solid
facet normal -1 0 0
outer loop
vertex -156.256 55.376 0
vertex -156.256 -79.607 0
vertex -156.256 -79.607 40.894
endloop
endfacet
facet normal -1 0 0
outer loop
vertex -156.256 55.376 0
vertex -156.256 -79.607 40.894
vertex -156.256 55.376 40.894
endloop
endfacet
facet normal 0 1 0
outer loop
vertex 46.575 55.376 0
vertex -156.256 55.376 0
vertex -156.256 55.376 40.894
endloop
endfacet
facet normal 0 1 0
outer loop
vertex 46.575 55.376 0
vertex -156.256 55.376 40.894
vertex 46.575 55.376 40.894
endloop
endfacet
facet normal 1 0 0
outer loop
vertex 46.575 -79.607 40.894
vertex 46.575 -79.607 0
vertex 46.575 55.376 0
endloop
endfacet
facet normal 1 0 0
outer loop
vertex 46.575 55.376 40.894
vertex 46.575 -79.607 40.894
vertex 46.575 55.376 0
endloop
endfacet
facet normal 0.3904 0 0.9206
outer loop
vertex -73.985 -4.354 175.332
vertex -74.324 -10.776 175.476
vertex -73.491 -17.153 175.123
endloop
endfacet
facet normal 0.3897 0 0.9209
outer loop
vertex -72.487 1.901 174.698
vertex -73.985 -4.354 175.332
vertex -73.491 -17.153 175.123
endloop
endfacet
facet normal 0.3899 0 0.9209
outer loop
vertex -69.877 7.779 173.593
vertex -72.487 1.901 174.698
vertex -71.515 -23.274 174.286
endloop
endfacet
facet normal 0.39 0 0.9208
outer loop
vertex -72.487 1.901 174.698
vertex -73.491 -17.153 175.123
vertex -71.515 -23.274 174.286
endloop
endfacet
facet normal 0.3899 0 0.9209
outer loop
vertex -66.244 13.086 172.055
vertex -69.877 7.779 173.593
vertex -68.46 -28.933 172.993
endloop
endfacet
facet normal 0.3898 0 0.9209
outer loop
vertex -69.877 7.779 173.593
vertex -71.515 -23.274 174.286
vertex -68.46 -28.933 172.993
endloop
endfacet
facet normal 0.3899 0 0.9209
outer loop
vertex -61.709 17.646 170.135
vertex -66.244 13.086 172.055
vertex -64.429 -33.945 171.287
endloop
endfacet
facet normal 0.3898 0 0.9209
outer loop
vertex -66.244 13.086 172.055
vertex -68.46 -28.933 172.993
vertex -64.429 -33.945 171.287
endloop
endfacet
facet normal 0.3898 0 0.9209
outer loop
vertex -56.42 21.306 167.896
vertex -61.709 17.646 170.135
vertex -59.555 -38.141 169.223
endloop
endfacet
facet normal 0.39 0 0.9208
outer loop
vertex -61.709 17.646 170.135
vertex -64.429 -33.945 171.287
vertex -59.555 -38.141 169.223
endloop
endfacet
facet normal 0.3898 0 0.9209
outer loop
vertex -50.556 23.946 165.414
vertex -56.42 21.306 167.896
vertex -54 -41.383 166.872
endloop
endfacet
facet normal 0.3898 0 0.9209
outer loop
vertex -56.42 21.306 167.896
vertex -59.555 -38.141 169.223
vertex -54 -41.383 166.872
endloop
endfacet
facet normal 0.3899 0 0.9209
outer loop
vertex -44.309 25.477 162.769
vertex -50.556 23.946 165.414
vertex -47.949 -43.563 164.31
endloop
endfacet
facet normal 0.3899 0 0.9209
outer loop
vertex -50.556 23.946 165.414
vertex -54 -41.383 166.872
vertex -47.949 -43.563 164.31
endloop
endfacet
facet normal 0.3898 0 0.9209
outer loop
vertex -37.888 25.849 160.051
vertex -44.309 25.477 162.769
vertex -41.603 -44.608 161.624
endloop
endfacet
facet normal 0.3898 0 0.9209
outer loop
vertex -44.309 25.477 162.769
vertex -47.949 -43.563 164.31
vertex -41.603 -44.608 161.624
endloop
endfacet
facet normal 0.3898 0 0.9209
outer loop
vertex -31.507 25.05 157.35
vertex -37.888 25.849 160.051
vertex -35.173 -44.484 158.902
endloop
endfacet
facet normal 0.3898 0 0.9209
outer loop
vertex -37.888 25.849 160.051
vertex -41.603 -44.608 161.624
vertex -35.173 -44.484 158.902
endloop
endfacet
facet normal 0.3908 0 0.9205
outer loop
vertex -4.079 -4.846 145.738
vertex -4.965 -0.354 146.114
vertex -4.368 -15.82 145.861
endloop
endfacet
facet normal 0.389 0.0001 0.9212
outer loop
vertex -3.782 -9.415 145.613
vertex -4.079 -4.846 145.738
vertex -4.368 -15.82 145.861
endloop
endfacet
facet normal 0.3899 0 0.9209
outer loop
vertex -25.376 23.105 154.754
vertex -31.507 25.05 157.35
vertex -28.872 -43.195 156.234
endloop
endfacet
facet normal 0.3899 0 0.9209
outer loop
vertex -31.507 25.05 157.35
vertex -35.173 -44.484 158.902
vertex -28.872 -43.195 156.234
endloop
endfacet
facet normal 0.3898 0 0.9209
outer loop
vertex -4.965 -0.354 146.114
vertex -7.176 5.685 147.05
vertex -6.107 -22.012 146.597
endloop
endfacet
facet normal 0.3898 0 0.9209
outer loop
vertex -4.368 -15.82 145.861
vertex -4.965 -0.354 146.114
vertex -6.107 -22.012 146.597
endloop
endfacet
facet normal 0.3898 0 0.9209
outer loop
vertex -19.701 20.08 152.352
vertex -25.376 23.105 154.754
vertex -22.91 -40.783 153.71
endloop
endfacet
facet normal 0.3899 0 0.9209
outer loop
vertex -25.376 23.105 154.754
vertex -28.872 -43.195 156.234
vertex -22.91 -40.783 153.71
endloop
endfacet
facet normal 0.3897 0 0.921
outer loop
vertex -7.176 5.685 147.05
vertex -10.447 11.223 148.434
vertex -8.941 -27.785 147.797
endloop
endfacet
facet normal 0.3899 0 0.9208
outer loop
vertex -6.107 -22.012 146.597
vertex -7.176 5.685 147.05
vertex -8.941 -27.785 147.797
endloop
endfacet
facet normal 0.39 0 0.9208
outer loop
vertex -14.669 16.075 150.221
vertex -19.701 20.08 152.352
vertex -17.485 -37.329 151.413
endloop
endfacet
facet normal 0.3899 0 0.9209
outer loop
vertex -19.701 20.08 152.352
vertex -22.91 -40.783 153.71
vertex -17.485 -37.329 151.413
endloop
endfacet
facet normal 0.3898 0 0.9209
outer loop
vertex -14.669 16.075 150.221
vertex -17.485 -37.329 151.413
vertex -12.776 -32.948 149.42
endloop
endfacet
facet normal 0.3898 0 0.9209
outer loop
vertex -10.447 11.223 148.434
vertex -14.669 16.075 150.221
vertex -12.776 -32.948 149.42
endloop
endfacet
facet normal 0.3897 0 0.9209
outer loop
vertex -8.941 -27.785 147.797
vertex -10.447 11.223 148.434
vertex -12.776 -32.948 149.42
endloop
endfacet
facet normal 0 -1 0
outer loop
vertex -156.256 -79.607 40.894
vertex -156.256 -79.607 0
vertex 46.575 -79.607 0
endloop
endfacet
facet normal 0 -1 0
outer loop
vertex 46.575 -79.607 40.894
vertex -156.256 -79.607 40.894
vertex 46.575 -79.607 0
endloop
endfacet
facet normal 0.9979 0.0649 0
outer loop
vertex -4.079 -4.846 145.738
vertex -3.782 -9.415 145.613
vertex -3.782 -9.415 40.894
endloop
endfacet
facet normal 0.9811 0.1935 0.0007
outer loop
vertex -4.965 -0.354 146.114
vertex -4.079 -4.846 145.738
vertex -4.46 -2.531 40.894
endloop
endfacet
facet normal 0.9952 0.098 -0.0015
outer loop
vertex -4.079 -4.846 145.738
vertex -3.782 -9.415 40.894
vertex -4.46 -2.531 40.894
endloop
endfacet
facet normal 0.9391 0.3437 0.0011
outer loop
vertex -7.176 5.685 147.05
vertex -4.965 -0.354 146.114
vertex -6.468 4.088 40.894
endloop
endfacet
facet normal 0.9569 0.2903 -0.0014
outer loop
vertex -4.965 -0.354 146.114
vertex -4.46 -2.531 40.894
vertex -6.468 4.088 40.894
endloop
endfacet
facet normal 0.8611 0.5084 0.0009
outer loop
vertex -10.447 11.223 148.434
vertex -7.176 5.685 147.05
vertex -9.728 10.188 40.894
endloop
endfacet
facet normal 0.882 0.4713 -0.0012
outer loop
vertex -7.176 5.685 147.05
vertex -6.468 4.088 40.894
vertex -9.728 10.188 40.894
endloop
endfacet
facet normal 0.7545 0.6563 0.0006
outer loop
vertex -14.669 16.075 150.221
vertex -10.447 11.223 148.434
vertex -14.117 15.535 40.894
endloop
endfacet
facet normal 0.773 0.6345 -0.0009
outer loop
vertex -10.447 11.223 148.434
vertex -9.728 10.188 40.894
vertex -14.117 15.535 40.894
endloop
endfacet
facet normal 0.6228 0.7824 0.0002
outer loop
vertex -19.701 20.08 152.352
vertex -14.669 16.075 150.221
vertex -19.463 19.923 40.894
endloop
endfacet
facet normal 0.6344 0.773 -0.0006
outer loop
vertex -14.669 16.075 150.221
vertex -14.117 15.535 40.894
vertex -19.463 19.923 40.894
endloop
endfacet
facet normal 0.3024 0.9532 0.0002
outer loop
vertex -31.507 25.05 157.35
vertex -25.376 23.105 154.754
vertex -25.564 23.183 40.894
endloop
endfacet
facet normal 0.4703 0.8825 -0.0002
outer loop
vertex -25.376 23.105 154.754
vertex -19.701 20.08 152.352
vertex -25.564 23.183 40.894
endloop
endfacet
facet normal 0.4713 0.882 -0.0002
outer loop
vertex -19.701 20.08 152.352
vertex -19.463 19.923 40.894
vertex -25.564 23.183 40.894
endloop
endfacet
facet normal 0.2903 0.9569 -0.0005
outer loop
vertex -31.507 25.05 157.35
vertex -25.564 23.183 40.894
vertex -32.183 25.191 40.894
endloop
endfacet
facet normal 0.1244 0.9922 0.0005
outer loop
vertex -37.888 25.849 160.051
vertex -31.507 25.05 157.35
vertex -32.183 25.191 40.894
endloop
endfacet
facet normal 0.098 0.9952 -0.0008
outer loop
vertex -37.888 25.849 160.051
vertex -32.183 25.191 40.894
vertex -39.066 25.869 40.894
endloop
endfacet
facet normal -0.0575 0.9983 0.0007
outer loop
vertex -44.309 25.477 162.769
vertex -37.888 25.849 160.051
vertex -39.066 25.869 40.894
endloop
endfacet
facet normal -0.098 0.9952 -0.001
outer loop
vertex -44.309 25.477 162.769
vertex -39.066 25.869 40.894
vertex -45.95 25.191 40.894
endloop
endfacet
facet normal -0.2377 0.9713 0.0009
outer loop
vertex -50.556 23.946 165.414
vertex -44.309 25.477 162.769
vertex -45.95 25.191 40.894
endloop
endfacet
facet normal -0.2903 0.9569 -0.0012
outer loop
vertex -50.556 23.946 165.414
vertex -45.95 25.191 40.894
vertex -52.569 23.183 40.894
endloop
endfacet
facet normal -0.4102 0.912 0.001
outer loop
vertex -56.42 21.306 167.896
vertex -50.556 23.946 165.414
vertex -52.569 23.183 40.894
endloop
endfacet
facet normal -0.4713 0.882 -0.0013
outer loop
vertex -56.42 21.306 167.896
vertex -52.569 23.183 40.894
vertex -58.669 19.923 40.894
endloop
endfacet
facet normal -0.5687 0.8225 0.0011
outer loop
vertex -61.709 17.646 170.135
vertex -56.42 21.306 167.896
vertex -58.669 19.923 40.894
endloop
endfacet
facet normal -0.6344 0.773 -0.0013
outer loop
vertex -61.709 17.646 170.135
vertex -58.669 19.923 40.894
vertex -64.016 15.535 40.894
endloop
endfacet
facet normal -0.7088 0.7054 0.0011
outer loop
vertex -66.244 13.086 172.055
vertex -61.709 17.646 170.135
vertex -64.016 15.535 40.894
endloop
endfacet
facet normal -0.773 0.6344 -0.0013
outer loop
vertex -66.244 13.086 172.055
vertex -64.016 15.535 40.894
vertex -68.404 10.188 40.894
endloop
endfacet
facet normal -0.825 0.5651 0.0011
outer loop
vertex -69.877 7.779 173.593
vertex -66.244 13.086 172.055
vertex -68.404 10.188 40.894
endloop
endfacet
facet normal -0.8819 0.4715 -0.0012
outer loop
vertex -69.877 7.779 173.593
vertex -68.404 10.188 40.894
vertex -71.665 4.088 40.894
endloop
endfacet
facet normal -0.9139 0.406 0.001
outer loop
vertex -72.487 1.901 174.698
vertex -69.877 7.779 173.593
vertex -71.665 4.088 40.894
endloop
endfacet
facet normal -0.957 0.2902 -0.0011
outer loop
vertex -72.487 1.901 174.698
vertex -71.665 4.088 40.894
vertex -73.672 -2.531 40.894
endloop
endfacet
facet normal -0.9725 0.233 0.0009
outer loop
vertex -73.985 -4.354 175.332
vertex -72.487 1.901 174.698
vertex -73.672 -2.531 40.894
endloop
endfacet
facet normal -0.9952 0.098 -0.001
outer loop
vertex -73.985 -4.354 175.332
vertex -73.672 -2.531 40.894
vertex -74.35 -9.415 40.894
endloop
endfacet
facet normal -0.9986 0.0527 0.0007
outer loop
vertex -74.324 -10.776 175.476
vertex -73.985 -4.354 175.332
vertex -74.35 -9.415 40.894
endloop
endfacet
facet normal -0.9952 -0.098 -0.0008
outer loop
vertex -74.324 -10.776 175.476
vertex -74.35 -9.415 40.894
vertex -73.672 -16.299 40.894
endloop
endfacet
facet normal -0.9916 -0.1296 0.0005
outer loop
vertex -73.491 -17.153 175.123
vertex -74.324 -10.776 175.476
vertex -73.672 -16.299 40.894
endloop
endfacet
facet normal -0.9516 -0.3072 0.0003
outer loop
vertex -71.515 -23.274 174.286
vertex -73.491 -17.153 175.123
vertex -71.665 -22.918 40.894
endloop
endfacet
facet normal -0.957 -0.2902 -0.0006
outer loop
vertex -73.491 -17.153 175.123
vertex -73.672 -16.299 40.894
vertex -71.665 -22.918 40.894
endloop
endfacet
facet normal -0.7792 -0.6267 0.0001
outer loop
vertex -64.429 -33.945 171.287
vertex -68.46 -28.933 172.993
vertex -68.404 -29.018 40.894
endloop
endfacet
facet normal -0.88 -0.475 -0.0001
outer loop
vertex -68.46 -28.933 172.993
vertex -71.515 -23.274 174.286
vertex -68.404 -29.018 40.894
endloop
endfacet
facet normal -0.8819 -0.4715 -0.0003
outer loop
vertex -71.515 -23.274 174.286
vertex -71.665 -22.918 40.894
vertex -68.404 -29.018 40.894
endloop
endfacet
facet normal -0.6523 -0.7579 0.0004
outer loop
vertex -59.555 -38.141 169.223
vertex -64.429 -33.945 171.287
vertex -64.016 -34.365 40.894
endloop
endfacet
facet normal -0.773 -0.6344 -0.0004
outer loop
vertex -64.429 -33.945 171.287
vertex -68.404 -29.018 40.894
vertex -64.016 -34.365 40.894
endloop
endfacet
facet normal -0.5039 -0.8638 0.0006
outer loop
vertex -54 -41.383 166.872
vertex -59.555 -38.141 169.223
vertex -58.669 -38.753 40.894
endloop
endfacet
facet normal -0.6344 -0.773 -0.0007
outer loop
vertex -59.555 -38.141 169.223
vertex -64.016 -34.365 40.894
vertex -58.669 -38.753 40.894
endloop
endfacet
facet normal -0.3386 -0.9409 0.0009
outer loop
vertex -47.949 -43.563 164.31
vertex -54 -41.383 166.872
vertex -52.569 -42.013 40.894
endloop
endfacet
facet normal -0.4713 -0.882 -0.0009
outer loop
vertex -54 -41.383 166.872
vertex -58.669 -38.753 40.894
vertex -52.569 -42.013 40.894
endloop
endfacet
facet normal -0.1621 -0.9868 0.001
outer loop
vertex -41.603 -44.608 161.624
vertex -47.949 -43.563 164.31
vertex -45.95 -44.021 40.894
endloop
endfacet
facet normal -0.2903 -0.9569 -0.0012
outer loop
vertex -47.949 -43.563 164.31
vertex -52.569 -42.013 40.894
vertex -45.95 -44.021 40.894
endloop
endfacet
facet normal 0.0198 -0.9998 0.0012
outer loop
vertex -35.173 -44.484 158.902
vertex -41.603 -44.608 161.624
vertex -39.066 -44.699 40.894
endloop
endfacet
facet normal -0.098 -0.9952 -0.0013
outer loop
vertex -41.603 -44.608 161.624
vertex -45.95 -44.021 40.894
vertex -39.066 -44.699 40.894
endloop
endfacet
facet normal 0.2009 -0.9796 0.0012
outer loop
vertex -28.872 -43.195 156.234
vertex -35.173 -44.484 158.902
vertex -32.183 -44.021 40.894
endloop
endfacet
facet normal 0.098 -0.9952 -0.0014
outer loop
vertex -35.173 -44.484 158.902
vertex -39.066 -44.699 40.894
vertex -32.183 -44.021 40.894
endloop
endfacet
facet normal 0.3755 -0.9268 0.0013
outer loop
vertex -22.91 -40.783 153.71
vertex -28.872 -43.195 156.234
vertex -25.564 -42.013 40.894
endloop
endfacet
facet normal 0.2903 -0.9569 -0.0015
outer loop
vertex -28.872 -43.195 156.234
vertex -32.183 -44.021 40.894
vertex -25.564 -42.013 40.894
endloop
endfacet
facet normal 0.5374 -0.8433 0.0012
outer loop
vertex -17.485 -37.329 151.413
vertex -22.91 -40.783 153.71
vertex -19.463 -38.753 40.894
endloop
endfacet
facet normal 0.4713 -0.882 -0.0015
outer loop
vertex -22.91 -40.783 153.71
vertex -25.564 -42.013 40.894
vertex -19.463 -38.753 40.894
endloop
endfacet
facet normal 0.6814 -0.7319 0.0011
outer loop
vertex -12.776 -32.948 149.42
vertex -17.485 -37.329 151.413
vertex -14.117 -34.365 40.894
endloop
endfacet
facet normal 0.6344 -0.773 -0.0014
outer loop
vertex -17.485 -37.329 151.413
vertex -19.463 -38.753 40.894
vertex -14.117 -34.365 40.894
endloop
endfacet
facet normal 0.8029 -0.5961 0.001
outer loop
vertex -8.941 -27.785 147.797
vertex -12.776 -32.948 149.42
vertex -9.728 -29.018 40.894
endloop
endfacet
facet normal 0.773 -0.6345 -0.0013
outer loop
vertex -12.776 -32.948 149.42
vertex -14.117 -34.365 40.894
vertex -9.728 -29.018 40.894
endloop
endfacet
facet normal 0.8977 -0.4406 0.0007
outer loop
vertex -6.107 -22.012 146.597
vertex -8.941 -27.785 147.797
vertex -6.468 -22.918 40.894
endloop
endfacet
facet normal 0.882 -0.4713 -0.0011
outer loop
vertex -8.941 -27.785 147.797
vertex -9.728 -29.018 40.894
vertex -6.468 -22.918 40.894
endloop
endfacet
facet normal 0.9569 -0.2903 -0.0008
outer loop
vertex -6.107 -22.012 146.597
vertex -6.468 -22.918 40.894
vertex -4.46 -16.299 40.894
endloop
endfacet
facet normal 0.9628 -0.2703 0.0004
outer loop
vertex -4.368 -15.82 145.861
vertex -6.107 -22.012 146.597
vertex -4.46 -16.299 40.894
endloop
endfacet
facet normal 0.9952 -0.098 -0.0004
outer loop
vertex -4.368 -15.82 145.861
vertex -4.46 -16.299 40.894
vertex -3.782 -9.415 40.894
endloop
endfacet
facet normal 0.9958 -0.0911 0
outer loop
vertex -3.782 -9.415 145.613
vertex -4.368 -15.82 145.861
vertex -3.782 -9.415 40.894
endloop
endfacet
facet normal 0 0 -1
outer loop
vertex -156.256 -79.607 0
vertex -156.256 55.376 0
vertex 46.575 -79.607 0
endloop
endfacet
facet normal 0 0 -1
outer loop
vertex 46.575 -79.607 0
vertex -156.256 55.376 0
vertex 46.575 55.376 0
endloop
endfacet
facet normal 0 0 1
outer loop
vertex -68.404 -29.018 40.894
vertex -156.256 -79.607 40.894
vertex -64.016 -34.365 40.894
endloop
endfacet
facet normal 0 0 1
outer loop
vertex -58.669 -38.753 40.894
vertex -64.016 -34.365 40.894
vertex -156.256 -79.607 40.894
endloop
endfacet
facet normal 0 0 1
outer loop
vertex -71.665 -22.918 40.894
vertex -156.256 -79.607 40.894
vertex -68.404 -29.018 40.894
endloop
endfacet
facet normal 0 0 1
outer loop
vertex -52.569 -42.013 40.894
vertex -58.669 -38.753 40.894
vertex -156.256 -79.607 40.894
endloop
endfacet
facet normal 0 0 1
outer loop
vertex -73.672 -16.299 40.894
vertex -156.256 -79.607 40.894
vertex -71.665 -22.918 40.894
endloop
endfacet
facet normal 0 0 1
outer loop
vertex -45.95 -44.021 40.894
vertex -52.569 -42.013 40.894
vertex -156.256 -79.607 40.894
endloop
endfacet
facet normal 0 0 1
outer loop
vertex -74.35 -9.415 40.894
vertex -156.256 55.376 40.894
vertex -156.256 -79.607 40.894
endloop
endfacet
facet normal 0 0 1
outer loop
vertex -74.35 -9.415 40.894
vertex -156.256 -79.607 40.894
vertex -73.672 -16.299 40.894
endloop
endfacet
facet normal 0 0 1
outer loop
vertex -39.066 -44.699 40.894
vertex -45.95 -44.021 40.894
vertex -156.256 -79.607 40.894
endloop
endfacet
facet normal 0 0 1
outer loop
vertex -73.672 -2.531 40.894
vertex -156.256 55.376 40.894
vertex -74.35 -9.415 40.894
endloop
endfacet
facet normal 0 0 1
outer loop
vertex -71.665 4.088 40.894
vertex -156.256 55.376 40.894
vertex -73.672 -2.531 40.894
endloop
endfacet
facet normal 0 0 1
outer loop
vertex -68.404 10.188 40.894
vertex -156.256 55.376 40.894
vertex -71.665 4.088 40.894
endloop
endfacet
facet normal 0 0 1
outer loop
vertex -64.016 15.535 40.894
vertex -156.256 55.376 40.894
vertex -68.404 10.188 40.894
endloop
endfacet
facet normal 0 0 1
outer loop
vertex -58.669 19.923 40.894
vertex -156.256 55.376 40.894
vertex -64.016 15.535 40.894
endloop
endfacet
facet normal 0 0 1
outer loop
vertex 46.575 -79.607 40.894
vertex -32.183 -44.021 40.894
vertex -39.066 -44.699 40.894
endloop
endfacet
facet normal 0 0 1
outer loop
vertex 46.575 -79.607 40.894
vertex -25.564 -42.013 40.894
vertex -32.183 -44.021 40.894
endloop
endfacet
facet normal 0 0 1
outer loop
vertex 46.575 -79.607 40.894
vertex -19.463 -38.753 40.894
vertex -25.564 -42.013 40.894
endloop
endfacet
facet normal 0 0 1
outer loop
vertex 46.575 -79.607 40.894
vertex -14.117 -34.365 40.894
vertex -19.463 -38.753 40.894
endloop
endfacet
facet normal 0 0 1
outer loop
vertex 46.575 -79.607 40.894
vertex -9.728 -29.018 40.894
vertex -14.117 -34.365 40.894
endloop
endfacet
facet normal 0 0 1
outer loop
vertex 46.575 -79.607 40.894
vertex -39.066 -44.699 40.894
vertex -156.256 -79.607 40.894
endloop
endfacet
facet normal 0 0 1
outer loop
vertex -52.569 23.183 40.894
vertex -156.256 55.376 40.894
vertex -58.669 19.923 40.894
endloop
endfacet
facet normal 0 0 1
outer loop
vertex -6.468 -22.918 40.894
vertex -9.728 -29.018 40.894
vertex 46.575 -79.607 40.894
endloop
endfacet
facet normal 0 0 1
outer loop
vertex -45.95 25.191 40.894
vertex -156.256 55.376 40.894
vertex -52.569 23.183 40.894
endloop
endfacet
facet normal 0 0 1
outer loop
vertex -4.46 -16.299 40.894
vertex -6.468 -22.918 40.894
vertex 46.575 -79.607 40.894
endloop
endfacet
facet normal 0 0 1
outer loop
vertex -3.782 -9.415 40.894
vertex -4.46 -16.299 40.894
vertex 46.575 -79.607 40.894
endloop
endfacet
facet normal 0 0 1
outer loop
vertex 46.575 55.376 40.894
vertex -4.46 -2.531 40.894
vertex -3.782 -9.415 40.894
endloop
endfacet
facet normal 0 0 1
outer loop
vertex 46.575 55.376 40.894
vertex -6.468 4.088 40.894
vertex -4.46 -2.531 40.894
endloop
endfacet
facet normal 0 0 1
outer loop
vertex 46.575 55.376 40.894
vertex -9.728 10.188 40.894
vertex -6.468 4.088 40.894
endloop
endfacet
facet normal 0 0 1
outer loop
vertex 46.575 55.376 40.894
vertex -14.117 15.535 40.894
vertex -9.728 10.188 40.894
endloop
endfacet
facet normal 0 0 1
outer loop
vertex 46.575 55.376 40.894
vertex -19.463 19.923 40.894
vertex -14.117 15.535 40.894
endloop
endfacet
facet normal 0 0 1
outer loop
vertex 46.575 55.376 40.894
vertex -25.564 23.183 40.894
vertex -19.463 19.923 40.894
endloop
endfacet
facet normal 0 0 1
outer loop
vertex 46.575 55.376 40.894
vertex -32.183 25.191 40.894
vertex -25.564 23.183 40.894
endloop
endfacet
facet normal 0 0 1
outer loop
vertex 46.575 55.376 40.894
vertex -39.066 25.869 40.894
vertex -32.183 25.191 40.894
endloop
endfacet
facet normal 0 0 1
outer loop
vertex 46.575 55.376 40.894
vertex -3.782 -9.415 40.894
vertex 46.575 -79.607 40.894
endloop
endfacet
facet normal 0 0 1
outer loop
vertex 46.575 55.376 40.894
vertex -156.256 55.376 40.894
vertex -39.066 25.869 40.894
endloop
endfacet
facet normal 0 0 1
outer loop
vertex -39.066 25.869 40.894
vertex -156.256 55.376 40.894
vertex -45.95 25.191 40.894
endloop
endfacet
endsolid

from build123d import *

# Parameters (mm, degrees)
F0_W     = 202.830822
F0_H     = 134.983119
F1_DEPTH = 40.894
F2_R     = 35.284154
F3_DEPTH = 134.62
F5_DEPTH = 96.012


with BuildPart() as f1:
    # F0 (on Top) → F1 (new body)
    with BuildSketch(Plane.XY):
        with Locations((-54.840356, -12.115913)):
            Rectangle(F0_W, F0_H)
    extrude(amount=F1_DEPTH)

    # F2 (on face) → F3 (join)
    with BuildSketch(Plane.XY.offset(40.894)):
        with Locations((-39.066195, -9.414996)):
            Circle(F2_R)
    extrude(amount=F3_DEPTH)

    # F4 (on Front) → F5 (cut, symmetric)
    with BuildSketch(Plane.XZ):
        Polygon((38.168721, 193.453133), (-104.439028, 188.224182), (38.168721, 127.853572), align=None)
    extrude(amount=F5_DEPTH, both=True, mode=Mode.SUBTRACT)


solid = f1.part
